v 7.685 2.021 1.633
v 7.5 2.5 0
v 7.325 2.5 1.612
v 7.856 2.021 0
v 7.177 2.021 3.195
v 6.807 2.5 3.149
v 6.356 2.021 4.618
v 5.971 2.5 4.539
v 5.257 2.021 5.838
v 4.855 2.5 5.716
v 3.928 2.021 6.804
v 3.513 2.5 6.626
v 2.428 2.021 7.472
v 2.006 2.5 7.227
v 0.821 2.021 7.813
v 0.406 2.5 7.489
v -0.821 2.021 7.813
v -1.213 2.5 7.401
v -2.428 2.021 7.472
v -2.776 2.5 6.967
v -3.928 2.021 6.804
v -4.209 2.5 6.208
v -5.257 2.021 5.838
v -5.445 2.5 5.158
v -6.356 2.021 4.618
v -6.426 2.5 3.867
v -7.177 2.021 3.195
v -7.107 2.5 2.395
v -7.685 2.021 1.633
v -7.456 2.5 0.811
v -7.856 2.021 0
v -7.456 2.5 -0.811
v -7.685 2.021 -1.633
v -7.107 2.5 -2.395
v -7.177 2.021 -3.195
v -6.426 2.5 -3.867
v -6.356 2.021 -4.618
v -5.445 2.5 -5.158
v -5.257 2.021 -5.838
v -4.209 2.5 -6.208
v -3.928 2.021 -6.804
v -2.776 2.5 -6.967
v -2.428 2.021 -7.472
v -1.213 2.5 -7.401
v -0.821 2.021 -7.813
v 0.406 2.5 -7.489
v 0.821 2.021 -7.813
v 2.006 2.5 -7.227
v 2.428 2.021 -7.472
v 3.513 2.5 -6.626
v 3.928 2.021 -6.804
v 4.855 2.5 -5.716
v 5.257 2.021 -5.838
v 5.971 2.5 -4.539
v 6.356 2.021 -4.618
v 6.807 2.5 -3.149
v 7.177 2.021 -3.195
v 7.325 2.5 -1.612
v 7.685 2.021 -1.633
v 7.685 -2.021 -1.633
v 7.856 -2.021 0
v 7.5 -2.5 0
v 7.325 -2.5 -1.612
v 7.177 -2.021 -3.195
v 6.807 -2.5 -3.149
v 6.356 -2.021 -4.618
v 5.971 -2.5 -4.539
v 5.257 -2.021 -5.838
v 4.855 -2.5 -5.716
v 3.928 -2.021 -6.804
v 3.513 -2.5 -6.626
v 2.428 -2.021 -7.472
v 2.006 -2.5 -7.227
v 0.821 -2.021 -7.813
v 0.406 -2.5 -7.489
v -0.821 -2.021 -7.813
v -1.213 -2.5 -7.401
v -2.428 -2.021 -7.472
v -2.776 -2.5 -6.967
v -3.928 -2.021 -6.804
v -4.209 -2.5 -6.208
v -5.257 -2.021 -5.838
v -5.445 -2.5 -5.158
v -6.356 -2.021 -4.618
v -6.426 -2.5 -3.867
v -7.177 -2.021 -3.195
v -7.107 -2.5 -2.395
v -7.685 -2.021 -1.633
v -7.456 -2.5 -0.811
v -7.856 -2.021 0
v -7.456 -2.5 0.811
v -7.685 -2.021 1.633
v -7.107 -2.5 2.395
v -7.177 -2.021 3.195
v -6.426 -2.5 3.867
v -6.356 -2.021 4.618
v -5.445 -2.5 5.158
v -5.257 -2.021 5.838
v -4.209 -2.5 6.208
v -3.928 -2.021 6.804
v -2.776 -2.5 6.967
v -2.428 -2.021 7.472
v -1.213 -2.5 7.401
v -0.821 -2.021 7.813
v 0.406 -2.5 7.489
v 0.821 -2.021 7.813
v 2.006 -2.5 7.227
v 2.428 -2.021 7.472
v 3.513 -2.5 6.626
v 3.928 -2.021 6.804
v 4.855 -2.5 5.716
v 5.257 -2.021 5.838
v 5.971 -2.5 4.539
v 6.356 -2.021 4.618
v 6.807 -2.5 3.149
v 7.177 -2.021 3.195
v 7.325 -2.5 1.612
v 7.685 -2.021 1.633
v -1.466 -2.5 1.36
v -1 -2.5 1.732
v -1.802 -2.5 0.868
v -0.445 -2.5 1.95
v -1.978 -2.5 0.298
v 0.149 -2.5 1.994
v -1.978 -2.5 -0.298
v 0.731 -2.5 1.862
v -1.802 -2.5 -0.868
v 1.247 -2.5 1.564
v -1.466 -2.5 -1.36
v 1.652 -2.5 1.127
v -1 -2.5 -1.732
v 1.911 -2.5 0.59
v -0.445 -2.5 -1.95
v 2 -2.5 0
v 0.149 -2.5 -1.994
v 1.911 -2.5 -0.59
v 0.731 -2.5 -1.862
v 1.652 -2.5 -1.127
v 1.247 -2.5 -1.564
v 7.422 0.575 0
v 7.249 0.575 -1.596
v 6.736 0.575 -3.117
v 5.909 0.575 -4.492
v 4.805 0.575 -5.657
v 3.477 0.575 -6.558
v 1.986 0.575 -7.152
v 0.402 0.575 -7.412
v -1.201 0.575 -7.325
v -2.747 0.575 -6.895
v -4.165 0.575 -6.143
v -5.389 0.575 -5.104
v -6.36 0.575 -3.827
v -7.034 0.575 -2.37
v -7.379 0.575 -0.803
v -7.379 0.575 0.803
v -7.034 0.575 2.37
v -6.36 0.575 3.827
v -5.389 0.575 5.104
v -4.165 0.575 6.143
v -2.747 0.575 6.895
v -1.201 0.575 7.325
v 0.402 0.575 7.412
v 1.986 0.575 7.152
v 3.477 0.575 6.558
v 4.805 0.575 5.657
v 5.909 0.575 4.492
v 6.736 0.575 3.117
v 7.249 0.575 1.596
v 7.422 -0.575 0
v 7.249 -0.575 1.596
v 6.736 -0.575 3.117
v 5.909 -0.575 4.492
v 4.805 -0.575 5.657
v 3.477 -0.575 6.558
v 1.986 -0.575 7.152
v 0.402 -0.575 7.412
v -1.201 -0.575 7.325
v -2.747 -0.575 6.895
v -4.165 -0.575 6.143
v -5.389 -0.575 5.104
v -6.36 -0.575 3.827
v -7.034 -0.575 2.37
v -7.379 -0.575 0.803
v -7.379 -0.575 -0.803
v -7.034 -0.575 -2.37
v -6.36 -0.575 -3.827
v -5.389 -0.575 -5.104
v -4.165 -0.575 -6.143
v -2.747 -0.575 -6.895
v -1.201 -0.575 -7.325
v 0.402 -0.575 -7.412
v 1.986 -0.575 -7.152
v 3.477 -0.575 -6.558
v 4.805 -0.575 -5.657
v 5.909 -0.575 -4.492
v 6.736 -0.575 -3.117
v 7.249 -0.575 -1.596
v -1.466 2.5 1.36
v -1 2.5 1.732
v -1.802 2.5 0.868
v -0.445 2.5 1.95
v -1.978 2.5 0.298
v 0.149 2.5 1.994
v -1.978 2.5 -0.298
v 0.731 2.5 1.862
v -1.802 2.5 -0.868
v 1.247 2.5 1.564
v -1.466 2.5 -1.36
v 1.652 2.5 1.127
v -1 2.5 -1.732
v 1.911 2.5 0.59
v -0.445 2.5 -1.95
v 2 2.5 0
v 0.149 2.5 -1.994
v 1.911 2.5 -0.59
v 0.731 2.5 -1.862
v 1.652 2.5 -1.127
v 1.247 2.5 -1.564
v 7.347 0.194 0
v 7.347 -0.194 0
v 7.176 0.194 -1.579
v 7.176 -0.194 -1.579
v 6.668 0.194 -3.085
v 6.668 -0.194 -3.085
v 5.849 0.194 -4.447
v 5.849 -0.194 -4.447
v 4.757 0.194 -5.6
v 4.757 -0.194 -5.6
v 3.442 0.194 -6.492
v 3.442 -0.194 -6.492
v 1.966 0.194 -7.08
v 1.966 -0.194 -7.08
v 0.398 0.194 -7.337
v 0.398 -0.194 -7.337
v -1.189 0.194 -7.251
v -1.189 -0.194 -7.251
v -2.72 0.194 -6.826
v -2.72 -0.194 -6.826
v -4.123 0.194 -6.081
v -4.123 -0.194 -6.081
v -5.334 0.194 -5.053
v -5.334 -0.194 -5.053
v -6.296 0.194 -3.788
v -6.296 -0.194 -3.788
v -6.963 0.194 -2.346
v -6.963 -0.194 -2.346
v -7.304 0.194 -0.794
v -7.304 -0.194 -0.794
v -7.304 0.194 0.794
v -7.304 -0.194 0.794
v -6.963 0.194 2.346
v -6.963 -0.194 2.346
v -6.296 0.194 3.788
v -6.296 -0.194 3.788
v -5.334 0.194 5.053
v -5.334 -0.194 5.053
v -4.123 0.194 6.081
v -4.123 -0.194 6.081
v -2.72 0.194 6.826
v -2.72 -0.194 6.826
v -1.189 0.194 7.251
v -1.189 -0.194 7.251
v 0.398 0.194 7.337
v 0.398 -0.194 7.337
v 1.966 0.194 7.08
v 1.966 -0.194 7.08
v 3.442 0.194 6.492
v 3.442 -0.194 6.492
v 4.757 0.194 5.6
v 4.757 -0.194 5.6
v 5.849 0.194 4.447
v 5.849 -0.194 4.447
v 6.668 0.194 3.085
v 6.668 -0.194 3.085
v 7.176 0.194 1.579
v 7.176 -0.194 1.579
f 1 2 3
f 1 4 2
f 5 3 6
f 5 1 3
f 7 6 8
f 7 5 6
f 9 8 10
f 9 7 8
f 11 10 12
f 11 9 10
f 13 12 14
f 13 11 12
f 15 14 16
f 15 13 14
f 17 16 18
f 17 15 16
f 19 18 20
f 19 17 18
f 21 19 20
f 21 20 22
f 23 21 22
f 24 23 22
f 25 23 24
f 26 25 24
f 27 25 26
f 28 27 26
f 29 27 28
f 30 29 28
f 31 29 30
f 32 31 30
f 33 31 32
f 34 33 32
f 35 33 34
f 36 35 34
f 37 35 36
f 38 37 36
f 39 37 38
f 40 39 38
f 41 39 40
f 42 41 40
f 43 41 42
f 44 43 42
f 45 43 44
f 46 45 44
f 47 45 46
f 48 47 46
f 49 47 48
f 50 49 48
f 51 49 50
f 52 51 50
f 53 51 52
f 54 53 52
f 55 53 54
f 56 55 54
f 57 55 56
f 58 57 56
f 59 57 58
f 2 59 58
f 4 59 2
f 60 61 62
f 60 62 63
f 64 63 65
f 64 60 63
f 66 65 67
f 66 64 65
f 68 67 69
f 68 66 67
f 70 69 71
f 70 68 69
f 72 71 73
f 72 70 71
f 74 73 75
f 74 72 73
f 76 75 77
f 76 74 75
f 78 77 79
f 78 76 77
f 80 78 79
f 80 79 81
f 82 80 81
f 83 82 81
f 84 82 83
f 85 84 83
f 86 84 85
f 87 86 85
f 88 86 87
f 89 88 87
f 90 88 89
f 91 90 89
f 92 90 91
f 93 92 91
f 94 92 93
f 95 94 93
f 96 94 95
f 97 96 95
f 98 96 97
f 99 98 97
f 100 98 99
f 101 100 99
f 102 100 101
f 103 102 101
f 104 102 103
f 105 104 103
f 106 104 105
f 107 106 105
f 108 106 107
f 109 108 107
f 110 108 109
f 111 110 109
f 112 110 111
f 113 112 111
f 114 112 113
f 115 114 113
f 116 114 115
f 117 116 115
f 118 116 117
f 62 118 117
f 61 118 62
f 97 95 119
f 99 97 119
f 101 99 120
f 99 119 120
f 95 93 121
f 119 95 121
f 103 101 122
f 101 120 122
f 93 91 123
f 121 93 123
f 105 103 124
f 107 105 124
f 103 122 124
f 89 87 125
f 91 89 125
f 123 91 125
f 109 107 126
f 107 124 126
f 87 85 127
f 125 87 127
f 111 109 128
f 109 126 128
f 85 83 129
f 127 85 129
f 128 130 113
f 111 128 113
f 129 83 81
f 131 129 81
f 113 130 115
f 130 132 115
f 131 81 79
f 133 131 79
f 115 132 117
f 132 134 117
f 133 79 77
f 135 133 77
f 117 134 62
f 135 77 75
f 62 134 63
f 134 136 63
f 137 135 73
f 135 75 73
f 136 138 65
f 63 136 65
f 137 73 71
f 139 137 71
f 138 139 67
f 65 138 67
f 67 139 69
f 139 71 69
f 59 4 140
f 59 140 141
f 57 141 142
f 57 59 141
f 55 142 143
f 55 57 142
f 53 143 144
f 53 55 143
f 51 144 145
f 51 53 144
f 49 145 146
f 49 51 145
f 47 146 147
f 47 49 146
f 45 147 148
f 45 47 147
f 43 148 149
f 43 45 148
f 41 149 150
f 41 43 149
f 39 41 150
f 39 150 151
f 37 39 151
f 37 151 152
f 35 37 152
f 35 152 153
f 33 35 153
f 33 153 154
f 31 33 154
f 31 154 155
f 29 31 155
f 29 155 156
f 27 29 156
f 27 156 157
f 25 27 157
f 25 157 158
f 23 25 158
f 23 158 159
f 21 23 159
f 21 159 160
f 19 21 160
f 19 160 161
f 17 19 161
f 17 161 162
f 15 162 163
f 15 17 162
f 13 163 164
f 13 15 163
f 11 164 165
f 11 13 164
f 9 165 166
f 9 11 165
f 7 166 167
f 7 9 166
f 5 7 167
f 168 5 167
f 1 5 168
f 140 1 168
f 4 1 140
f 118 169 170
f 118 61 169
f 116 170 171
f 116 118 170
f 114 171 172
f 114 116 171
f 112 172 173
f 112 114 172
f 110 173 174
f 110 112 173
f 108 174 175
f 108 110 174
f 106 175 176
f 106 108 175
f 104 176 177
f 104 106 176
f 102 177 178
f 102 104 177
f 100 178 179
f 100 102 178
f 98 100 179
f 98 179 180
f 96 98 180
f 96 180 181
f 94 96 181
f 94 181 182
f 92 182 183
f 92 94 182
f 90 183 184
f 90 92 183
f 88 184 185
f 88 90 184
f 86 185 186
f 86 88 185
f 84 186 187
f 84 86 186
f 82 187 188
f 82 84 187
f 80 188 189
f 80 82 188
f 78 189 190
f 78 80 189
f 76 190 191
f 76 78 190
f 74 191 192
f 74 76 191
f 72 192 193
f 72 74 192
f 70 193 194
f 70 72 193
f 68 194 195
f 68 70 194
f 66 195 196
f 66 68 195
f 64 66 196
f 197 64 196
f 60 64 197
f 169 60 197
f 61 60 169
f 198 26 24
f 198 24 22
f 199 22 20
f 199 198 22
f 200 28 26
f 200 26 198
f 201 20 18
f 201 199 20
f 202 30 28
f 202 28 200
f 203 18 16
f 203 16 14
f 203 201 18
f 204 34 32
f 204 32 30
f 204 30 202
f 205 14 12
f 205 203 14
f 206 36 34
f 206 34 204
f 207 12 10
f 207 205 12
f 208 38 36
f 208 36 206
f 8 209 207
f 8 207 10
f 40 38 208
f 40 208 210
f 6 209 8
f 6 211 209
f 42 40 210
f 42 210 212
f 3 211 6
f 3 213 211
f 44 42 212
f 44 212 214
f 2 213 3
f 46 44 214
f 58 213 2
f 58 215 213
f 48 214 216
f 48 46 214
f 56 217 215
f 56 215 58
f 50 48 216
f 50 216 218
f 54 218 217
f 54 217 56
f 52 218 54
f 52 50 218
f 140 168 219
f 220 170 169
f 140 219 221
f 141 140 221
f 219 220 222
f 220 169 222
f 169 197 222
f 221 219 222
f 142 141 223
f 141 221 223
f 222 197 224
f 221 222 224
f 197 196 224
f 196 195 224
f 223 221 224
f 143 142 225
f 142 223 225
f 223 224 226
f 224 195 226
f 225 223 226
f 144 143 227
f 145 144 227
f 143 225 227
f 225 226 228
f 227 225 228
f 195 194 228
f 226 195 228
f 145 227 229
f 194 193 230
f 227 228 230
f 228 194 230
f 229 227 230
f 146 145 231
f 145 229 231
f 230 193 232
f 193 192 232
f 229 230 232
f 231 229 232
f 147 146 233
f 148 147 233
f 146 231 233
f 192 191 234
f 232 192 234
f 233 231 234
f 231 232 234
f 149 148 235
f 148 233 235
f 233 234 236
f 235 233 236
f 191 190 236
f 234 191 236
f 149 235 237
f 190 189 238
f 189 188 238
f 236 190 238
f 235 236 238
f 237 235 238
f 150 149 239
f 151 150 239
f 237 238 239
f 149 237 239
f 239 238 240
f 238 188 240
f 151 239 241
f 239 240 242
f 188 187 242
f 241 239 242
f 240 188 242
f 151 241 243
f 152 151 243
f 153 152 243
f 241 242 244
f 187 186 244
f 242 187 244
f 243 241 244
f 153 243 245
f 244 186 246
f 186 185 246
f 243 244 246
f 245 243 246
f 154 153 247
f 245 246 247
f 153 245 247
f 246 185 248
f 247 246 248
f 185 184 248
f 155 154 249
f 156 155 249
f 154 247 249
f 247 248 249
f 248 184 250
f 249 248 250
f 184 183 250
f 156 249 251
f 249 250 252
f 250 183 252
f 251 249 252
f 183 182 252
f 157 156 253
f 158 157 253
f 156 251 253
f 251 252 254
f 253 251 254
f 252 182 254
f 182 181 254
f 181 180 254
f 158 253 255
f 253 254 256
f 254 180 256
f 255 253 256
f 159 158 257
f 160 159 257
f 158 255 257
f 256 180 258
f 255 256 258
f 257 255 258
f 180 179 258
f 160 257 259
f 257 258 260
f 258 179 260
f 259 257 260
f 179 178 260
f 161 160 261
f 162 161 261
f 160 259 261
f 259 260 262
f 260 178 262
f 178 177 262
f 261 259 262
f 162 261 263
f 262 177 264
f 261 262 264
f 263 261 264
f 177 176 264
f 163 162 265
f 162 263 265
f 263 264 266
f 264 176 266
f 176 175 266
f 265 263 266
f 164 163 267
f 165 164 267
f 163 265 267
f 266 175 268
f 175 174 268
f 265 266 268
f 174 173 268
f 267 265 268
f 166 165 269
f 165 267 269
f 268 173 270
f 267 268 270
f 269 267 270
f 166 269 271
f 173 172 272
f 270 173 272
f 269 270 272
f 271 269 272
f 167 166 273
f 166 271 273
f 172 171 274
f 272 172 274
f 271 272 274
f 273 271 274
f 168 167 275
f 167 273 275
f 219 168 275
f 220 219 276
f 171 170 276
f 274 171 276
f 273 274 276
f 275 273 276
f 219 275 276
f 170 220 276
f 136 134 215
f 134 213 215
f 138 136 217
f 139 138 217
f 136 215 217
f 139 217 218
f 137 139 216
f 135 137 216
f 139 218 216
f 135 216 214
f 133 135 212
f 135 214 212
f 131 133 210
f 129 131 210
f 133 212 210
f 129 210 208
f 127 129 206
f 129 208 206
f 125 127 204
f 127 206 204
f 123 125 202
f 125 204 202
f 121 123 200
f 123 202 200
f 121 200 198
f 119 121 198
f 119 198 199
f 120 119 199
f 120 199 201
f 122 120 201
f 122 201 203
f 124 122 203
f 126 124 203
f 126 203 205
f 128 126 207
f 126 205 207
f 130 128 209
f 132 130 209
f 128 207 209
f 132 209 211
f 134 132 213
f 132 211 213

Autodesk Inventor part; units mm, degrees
ref_plane "YZ Plane" through (0, 0, 0) normal (1, 0, 0) x (0, 1, 0)
ref_plane "XZ Plane" through (0, 0, 0) normal (0, 1, 0) x (-1, 0, 0)
ref_plane "XY Plane" through (0, 0, 0) normal (0, 0, 1) x (1, 0, 0)
sketch "Esquisse1" plane through (0, 0, 0) normal (0, 0, 1) x (1, 0, 0)
  line L0 (0, 0) -> (0, 2.5152)
  line L1 (2, -2.5) -> (2, 2.5)
  line L2 (2, 2.5) -> (8, 2.5)
  line L3 (8, 2.5) -> (7.4224, 0.5747)
  line L4 (7.4224, -0.5747) -> (8, -2.5)
  line L5 (8, -2.5) -> (2, -2.5)
  arc A0 (7.4224, 0.5747) -> (7.4224, -0.5747) centre (9.3381, 0) ccw
  point P0 (7.25, 0)
  dimension "d0" = 4
  dimension "d1" = 5
  dimension "d2" = 2.5
  dimension "d3" = 16
  dimension "d4" = 14.5
  dimension "d5" = 2
revolve "Révolution1" add sketch "Esquisse1" angle 360 about axis through (0, 0, 0) along (0, 1, 0)
chamfer "Chanfrein1" distance 0.5 angle 45 2 edges at (-8, 2.5, 0) (-8, -2.5, 0)
equation "\"d2\" = 0.5 * d1"
properties part number "Roulement a bille 634ZZ" material "----------"
